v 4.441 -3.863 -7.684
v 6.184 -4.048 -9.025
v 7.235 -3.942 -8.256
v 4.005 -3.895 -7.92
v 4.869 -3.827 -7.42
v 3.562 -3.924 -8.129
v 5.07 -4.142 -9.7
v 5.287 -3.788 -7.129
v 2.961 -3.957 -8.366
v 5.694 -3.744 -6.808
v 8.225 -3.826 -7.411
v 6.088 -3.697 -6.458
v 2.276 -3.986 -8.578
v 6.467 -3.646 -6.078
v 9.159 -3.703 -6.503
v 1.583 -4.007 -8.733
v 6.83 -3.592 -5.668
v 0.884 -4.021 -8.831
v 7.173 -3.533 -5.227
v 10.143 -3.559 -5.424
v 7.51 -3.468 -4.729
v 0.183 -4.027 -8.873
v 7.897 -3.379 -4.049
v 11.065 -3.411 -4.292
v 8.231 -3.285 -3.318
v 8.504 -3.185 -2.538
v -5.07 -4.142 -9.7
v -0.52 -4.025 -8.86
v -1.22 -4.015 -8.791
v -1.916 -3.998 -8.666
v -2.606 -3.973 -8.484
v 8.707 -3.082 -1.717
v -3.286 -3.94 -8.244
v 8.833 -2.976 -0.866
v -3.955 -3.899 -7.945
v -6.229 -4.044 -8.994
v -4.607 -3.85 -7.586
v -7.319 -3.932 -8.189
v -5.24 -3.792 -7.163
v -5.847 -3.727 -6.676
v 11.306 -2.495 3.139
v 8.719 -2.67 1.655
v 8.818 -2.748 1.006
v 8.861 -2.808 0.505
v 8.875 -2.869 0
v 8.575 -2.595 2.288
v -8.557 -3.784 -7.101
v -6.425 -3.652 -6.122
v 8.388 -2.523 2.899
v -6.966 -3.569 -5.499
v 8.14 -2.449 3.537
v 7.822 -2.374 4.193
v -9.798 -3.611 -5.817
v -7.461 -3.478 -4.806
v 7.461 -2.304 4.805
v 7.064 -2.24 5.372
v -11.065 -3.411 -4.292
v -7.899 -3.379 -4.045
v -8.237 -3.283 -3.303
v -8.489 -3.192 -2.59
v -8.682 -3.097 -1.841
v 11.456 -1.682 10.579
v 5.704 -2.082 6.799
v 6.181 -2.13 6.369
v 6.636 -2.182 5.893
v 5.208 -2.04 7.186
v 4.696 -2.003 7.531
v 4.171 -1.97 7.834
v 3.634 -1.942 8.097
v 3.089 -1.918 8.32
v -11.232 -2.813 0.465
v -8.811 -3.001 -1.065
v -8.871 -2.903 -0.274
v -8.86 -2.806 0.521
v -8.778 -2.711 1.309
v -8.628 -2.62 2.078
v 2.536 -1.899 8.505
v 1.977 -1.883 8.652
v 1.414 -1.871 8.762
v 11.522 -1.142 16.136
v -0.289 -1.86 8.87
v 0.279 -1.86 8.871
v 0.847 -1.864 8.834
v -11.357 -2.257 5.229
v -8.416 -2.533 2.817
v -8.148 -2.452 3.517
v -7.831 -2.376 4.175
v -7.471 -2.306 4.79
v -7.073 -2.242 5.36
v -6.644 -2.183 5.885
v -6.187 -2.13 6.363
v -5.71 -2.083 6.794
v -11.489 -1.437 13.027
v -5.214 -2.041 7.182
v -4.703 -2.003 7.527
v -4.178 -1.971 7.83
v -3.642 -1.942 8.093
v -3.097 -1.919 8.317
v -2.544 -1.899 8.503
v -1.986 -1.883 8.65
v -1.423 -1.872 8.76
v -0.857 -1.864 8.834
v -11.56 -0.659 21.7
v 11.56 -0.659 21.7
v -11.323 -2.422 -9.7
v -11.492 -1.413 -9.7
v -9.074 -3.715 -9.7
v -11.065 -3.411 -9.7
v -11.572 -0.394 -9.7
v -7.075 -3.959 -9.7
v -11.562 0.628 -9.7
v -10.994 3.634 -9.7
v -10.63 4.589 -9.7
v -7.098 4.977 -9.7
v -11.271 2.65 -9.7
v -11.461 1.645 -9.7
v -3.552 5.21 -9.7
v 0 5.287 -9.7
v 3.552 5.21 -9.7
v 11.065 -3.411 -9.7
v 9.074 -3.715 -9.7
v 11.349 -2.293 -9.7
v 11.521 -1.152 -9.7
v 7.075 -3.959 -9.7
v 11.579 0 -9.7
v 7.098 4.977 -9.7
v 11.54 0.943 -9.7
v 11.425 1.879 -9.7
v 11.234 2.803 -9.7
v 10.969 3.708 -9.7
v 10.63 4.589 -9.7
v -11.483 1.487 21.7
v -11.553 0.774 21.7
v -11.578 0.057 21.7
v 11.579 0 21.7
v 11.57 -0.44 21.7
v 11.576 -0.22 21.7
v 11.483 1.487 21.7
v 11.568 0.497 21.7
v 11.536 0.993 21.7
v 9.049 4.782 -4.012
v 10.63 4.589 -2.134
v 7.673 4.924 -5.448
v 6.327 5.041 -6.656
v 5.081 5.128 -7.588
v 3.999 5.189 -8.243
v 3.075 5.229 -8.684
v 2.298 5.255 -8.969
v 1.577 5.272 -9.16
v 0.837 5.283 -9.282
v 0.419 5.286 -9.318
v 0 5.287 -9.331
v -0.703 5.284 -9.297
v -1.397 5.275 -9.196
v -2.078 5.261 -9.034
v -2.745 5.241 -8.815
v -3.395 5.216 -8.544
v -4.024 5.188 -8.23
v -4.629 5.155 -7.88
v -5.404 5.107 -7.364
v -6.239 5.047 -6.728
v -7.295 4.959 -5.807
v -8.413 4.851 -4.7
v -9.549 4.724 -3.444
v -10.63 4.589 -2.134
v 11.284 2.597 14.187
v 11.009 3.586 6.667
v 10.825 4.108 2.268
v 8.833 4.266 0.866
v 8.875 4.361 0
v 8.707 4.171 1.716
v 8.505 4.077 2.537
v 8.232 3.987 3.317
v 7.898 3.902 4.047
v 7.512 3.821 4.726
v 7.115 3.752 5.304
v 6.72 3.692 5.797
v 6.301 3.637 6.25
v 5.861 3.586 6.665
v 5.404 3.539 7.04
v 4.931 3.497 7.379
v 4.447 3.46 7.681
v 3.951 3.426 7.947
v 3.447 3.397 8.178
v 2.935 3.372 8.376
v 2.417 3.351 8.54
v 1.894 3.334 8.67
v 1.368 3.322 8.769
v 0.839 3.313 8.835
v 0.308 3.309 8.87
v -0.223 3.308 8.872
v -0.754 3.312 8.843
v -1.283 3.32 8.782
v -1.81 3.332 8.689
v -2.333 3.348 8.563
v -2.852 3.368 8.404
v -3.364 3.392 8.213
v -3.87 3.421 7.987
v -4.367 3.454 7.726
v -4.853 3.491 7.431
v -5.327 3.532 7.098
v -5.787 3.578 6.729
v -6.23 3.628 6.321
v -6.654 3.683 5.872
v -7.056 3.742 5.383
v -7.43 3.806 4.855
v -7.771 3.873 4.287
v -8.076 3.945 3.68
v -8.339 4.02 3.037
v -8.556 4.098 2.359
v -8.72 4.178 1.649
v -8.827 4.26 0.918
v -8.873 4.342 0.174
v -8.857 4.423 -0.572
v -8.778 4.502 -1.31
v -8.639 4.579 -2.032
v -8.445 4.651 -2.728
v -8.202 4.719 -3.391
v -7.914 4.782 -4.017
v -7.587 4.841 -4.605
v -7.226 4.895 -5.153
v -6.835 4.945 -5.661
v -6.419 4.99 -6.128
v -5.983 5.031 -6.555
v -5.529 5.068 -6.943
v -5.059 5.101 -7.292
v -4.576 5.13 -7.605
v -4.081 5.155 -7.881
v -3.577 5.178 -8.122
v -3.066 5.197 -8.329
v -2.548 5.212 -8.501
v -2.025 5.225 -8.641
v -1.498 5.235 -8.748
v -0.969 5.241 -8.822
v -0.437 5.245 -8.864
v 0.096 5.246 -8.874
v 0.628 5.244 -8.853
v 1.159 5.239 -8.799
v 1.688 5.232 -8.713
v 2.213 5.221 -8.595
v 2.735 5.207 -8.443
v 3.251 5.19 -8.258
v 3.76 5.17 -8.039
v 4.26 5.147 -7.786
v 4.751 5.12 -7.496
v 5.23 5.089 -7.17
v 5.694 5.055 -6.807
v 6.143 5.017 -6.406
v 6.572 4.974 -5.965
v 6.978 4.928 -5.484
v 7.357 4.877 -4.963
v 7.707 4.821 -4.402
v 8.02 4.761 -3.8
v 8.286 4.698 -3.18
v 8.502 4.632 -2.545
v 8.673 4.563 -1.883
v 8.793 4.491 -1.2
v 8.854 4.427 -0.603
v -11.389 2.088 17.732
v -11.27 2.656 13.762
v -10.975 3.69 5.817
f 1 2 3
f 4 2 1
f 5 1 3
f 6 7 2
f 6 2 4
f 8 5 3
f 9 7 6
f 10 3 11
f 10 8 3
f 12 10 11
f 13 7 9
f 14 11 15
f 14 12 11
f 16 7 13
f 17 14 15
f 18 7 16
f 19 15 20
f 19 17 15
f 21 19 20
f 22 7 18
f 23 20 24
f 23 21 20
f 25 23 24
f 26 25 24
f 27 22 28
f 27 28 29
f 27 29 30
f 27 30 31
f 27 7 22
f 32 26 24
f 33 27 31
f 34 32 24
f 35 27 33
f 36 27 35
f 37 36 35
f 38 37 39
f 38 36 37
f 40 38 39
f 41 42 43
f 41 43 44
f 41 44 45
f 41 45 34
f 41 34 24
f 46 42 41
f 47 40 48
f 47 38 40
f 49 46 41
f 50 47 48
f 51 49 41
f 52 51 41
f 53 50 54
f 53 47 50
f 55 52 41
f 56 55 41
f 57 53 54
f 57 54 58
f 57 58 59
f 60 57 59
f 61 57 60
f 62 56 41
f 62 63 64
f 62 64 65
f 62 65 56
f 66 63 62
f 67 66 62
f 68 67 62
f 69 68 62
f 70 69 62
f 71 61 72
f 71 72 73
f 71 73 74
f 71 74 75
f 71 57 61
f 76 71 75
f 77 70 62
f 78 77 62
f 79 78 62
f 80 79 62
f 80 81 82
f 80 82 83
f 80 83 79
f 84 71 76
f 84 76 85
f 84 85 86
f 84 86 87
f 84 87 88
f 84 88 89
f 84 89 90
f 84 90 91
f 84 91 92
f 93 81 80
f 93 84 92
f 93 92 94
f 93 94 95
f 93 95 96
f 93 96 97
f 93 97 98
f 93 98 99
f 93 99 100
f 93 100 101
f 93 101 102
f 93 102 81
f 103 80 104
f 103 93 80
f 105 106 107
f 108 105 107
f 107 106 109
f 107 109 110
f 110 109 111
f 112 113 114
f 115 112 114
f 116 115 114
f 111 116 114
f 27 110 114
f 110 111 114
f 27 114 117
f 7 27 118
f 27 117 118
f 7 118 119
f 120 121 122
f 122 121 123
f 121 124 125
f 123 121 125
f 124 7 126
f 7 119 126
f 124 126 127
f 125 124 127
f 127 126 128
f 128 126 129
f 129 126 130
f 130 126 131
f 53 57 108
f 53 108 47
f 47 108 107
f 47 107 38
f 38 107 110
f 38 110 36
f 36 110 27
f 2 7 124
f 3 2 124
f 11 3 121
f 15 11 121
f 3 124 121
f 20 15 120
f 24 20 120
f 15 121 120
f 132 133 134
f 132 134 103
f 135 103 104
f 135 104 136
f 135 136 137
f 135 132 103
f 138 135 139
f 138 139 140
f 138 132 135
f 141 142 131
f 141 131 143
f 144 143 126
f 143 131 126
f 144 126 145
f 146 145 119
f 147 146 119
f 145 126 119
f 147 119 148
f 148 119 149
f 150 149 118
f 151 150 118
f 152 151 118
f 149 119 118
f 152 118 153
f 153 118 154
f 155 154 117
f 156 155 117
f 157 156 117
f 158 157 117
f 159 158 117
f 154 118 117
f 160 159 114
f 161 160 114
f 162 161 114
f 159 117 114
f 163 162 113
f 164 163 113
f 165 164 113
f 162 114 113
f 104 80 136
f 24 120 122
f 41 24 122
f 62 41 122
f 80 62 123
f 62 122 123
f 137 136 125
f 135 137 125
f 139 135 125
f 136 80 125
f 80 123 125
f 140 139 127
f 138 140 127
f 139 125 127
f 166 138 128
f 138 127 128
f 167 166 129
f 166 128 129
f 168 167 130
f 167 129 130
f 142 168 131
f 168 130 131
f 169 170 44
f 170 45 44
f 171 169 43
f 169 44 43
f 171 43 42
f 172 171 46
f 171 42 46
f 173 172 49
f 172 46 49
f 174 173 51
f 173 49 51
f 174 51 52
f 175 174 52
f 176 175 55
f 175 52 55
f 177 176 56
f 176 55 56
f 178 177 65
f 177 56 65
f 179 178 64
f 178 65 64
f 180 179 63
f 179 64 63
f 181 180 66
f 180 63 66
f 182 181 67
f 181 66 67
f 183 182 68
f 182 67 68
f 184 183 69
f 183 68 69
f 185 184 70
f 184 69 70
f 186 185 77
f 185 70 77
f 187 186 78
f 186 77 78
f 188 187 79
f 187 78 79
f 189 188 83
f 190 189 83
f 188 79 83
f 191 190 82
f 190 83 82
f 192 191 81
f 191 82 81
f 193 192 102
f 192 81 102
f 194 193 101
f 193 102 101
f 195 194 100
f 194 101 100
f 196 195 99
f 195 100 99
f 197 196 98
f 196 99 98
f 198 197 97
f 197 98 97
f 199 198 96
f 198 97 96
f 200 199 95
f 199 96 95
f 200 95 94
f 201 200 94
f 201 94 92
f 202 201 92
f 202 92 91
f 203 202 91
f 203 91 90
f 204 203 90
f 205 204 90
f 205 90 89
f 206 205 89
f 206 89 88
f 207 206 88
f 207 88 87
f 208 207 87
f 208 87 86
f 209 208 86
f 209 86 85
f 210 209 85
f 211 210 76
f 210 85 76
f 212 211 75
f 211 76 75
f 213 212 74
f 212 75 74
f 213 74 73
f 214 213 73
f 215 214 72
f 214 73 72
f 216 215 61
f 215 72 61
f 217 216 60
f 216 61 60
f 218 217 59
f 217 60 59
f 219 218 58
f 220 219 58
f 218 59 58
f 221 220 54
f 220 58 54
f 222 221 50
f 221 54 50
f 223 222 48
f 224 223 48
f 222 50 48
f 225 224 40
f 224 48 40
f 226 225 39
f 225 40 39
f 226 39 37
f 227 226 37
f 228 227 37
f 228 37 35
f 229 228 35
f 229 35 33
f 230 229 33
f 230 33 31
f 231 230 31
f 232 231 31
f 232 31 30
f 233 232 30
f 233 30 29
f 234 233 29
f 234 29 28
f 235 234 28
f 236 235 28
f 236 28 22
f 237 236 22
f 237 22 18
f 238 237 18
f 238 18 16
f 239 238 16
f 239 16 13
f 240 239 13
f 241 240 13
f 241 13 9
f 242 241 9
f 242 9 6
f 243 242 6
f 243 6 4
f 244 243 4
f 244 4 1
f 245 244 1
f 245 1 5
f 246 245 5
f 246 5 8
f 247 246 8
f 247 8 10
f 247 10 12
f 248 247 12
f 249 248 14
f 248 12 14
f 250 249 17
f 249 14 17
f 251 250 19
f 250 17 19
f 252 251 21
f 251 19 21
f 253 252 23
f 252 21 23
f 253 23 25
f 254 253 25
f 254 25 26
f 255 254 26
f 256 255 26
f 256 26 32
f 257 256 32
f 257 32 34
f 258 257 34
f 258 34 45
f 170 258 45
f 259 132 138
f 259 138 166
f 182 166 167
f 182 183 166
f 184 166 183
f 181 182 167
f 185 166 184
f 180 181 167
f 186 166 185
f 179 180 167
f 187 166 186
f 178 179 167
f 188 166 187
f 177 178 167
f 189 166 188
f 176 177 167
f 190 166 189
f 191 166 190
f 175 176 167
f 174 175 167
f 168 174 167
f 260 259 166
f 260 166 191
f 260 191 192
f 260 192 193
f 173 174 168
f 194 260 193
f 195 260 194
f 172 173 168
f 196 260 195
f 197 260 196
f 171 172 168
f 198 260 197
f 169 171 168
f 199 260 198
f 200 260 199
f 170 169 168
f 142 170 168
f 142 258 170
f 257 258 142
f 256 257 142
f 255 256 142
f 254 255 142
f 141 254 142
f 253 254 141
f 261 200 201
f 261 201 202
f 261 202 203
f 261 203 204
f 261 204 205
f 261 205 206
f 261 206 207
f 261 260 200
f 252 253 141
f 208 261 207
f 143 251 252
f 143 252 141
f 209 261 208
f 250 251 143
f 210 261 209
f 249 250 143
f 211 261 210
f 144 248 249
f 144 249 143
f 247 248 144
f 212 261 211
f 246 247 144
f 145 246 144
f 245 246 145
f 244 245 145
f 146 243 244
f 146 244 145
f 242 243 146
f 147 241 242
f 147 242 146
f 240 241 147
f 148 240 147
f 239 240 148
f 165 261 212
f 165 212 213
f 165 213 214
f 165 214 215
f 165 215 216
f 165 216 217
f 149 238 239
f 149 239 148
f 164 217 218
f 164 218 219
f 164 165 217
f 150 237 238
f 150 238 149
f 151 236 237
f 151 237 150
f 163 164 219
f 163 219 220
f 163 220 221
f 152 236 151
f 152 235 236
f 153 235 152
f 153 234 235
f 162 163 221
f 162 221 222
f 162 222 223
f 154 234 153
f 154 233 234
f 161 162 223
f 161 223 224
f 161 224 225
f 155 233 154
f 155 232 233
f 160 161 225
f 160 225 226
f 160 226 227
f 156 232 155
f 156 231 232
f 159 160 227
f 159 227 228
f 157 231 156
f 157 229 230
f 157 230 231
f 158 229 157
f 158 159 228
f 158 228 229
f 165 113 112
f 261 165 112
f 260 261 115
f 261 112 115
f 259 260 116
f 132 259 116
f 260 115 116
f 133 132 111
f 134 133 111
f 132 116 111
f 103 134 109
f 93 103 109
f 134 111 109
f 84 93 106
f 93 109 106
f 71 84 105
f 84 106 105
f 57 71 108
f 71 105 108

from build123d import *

# Parameters (mm, degrees)
F2_DEPTH      = 9.7
F2_DEPTH_BACK = 21.7
F0_R          = 8.875
F3_DEPTH      = 25
F3_DEPTH_BACK = 25
F5_DEPTH      = 25
F5_DEPTH_BACK = 25


with BuildPart() as f2:
    # F1 (on Top) → F2 (new body, two sides)
    with BuildSketch(Plane.XY) as f2_sk:
        with BuildLine():
            ThreePointArc((11.0648144764, -3.4107860847), (11.4494203432, -1.7246318209), (11.5785828629, 0))
            ThreePointArc((11.5785828629, 0), (11.3390271612, 2.3430843246), (10.6302726566, 4.5892139153))
            ThreePointArc((10.6302726566, 4.5892139153), (0, 5.2871789927), (-10.6302726566, 4.5892139153))
            ThreePointArc((-10.6302726566, 4.5892139153), (-11.5615397516, 0.6279965655), (-11.0648144764, -3.4107860847))
            ThreePointArc((-11.0648144764, -3.4107860847), (0, -4.3353080989), (11.0648144764, -3.4107860847))
        make_face()
    extrude(amount=-F2_DEPTH)
    extrude(f2_sk.sketch, amount=F2_DEPTH_BACK)

    # F0 (on Front) → F3 (cut, two sides)
    with BuildSketch(Plane.XZ) as f3_sk:
        Circle(F0_R)
    extrude(amount=-F3_DEPTH, mode=Mode.SUBTRACT)
    extrude(f3_sk.sketch, amount=F3_DEPTH_BACK, mode=Mode.SUBTRACT)

    # F4 (on Right) → F5 (cut, two sides)
    with BuildSketch(Plane.YZ) as f5_sk:
        with BuildLine():
            ThreePointArc((0, 30.6800138205), (3.7581649162, 5.252439566), (6.1427378096, -20.3405115753))
            ThreePointArc((6.1427378096, -20.3405115753), (0.1999286469, 33.1697739229), (-5.7428805158, -20.3405115753))
            ThreePointArc((-5.7428805158, -20.3405115753), (-2.2708328186, 5.1021466294), (0, 30.6800138205))
        make_face()
    extrude(amount=-F5_DEPTH, mode=Mode.SUBTRACT)
    extrude(f5_sk.sketch, amount=F5_DEPTH_BACK, mode=Mode.SUBTRACT)


solid = f2.part
